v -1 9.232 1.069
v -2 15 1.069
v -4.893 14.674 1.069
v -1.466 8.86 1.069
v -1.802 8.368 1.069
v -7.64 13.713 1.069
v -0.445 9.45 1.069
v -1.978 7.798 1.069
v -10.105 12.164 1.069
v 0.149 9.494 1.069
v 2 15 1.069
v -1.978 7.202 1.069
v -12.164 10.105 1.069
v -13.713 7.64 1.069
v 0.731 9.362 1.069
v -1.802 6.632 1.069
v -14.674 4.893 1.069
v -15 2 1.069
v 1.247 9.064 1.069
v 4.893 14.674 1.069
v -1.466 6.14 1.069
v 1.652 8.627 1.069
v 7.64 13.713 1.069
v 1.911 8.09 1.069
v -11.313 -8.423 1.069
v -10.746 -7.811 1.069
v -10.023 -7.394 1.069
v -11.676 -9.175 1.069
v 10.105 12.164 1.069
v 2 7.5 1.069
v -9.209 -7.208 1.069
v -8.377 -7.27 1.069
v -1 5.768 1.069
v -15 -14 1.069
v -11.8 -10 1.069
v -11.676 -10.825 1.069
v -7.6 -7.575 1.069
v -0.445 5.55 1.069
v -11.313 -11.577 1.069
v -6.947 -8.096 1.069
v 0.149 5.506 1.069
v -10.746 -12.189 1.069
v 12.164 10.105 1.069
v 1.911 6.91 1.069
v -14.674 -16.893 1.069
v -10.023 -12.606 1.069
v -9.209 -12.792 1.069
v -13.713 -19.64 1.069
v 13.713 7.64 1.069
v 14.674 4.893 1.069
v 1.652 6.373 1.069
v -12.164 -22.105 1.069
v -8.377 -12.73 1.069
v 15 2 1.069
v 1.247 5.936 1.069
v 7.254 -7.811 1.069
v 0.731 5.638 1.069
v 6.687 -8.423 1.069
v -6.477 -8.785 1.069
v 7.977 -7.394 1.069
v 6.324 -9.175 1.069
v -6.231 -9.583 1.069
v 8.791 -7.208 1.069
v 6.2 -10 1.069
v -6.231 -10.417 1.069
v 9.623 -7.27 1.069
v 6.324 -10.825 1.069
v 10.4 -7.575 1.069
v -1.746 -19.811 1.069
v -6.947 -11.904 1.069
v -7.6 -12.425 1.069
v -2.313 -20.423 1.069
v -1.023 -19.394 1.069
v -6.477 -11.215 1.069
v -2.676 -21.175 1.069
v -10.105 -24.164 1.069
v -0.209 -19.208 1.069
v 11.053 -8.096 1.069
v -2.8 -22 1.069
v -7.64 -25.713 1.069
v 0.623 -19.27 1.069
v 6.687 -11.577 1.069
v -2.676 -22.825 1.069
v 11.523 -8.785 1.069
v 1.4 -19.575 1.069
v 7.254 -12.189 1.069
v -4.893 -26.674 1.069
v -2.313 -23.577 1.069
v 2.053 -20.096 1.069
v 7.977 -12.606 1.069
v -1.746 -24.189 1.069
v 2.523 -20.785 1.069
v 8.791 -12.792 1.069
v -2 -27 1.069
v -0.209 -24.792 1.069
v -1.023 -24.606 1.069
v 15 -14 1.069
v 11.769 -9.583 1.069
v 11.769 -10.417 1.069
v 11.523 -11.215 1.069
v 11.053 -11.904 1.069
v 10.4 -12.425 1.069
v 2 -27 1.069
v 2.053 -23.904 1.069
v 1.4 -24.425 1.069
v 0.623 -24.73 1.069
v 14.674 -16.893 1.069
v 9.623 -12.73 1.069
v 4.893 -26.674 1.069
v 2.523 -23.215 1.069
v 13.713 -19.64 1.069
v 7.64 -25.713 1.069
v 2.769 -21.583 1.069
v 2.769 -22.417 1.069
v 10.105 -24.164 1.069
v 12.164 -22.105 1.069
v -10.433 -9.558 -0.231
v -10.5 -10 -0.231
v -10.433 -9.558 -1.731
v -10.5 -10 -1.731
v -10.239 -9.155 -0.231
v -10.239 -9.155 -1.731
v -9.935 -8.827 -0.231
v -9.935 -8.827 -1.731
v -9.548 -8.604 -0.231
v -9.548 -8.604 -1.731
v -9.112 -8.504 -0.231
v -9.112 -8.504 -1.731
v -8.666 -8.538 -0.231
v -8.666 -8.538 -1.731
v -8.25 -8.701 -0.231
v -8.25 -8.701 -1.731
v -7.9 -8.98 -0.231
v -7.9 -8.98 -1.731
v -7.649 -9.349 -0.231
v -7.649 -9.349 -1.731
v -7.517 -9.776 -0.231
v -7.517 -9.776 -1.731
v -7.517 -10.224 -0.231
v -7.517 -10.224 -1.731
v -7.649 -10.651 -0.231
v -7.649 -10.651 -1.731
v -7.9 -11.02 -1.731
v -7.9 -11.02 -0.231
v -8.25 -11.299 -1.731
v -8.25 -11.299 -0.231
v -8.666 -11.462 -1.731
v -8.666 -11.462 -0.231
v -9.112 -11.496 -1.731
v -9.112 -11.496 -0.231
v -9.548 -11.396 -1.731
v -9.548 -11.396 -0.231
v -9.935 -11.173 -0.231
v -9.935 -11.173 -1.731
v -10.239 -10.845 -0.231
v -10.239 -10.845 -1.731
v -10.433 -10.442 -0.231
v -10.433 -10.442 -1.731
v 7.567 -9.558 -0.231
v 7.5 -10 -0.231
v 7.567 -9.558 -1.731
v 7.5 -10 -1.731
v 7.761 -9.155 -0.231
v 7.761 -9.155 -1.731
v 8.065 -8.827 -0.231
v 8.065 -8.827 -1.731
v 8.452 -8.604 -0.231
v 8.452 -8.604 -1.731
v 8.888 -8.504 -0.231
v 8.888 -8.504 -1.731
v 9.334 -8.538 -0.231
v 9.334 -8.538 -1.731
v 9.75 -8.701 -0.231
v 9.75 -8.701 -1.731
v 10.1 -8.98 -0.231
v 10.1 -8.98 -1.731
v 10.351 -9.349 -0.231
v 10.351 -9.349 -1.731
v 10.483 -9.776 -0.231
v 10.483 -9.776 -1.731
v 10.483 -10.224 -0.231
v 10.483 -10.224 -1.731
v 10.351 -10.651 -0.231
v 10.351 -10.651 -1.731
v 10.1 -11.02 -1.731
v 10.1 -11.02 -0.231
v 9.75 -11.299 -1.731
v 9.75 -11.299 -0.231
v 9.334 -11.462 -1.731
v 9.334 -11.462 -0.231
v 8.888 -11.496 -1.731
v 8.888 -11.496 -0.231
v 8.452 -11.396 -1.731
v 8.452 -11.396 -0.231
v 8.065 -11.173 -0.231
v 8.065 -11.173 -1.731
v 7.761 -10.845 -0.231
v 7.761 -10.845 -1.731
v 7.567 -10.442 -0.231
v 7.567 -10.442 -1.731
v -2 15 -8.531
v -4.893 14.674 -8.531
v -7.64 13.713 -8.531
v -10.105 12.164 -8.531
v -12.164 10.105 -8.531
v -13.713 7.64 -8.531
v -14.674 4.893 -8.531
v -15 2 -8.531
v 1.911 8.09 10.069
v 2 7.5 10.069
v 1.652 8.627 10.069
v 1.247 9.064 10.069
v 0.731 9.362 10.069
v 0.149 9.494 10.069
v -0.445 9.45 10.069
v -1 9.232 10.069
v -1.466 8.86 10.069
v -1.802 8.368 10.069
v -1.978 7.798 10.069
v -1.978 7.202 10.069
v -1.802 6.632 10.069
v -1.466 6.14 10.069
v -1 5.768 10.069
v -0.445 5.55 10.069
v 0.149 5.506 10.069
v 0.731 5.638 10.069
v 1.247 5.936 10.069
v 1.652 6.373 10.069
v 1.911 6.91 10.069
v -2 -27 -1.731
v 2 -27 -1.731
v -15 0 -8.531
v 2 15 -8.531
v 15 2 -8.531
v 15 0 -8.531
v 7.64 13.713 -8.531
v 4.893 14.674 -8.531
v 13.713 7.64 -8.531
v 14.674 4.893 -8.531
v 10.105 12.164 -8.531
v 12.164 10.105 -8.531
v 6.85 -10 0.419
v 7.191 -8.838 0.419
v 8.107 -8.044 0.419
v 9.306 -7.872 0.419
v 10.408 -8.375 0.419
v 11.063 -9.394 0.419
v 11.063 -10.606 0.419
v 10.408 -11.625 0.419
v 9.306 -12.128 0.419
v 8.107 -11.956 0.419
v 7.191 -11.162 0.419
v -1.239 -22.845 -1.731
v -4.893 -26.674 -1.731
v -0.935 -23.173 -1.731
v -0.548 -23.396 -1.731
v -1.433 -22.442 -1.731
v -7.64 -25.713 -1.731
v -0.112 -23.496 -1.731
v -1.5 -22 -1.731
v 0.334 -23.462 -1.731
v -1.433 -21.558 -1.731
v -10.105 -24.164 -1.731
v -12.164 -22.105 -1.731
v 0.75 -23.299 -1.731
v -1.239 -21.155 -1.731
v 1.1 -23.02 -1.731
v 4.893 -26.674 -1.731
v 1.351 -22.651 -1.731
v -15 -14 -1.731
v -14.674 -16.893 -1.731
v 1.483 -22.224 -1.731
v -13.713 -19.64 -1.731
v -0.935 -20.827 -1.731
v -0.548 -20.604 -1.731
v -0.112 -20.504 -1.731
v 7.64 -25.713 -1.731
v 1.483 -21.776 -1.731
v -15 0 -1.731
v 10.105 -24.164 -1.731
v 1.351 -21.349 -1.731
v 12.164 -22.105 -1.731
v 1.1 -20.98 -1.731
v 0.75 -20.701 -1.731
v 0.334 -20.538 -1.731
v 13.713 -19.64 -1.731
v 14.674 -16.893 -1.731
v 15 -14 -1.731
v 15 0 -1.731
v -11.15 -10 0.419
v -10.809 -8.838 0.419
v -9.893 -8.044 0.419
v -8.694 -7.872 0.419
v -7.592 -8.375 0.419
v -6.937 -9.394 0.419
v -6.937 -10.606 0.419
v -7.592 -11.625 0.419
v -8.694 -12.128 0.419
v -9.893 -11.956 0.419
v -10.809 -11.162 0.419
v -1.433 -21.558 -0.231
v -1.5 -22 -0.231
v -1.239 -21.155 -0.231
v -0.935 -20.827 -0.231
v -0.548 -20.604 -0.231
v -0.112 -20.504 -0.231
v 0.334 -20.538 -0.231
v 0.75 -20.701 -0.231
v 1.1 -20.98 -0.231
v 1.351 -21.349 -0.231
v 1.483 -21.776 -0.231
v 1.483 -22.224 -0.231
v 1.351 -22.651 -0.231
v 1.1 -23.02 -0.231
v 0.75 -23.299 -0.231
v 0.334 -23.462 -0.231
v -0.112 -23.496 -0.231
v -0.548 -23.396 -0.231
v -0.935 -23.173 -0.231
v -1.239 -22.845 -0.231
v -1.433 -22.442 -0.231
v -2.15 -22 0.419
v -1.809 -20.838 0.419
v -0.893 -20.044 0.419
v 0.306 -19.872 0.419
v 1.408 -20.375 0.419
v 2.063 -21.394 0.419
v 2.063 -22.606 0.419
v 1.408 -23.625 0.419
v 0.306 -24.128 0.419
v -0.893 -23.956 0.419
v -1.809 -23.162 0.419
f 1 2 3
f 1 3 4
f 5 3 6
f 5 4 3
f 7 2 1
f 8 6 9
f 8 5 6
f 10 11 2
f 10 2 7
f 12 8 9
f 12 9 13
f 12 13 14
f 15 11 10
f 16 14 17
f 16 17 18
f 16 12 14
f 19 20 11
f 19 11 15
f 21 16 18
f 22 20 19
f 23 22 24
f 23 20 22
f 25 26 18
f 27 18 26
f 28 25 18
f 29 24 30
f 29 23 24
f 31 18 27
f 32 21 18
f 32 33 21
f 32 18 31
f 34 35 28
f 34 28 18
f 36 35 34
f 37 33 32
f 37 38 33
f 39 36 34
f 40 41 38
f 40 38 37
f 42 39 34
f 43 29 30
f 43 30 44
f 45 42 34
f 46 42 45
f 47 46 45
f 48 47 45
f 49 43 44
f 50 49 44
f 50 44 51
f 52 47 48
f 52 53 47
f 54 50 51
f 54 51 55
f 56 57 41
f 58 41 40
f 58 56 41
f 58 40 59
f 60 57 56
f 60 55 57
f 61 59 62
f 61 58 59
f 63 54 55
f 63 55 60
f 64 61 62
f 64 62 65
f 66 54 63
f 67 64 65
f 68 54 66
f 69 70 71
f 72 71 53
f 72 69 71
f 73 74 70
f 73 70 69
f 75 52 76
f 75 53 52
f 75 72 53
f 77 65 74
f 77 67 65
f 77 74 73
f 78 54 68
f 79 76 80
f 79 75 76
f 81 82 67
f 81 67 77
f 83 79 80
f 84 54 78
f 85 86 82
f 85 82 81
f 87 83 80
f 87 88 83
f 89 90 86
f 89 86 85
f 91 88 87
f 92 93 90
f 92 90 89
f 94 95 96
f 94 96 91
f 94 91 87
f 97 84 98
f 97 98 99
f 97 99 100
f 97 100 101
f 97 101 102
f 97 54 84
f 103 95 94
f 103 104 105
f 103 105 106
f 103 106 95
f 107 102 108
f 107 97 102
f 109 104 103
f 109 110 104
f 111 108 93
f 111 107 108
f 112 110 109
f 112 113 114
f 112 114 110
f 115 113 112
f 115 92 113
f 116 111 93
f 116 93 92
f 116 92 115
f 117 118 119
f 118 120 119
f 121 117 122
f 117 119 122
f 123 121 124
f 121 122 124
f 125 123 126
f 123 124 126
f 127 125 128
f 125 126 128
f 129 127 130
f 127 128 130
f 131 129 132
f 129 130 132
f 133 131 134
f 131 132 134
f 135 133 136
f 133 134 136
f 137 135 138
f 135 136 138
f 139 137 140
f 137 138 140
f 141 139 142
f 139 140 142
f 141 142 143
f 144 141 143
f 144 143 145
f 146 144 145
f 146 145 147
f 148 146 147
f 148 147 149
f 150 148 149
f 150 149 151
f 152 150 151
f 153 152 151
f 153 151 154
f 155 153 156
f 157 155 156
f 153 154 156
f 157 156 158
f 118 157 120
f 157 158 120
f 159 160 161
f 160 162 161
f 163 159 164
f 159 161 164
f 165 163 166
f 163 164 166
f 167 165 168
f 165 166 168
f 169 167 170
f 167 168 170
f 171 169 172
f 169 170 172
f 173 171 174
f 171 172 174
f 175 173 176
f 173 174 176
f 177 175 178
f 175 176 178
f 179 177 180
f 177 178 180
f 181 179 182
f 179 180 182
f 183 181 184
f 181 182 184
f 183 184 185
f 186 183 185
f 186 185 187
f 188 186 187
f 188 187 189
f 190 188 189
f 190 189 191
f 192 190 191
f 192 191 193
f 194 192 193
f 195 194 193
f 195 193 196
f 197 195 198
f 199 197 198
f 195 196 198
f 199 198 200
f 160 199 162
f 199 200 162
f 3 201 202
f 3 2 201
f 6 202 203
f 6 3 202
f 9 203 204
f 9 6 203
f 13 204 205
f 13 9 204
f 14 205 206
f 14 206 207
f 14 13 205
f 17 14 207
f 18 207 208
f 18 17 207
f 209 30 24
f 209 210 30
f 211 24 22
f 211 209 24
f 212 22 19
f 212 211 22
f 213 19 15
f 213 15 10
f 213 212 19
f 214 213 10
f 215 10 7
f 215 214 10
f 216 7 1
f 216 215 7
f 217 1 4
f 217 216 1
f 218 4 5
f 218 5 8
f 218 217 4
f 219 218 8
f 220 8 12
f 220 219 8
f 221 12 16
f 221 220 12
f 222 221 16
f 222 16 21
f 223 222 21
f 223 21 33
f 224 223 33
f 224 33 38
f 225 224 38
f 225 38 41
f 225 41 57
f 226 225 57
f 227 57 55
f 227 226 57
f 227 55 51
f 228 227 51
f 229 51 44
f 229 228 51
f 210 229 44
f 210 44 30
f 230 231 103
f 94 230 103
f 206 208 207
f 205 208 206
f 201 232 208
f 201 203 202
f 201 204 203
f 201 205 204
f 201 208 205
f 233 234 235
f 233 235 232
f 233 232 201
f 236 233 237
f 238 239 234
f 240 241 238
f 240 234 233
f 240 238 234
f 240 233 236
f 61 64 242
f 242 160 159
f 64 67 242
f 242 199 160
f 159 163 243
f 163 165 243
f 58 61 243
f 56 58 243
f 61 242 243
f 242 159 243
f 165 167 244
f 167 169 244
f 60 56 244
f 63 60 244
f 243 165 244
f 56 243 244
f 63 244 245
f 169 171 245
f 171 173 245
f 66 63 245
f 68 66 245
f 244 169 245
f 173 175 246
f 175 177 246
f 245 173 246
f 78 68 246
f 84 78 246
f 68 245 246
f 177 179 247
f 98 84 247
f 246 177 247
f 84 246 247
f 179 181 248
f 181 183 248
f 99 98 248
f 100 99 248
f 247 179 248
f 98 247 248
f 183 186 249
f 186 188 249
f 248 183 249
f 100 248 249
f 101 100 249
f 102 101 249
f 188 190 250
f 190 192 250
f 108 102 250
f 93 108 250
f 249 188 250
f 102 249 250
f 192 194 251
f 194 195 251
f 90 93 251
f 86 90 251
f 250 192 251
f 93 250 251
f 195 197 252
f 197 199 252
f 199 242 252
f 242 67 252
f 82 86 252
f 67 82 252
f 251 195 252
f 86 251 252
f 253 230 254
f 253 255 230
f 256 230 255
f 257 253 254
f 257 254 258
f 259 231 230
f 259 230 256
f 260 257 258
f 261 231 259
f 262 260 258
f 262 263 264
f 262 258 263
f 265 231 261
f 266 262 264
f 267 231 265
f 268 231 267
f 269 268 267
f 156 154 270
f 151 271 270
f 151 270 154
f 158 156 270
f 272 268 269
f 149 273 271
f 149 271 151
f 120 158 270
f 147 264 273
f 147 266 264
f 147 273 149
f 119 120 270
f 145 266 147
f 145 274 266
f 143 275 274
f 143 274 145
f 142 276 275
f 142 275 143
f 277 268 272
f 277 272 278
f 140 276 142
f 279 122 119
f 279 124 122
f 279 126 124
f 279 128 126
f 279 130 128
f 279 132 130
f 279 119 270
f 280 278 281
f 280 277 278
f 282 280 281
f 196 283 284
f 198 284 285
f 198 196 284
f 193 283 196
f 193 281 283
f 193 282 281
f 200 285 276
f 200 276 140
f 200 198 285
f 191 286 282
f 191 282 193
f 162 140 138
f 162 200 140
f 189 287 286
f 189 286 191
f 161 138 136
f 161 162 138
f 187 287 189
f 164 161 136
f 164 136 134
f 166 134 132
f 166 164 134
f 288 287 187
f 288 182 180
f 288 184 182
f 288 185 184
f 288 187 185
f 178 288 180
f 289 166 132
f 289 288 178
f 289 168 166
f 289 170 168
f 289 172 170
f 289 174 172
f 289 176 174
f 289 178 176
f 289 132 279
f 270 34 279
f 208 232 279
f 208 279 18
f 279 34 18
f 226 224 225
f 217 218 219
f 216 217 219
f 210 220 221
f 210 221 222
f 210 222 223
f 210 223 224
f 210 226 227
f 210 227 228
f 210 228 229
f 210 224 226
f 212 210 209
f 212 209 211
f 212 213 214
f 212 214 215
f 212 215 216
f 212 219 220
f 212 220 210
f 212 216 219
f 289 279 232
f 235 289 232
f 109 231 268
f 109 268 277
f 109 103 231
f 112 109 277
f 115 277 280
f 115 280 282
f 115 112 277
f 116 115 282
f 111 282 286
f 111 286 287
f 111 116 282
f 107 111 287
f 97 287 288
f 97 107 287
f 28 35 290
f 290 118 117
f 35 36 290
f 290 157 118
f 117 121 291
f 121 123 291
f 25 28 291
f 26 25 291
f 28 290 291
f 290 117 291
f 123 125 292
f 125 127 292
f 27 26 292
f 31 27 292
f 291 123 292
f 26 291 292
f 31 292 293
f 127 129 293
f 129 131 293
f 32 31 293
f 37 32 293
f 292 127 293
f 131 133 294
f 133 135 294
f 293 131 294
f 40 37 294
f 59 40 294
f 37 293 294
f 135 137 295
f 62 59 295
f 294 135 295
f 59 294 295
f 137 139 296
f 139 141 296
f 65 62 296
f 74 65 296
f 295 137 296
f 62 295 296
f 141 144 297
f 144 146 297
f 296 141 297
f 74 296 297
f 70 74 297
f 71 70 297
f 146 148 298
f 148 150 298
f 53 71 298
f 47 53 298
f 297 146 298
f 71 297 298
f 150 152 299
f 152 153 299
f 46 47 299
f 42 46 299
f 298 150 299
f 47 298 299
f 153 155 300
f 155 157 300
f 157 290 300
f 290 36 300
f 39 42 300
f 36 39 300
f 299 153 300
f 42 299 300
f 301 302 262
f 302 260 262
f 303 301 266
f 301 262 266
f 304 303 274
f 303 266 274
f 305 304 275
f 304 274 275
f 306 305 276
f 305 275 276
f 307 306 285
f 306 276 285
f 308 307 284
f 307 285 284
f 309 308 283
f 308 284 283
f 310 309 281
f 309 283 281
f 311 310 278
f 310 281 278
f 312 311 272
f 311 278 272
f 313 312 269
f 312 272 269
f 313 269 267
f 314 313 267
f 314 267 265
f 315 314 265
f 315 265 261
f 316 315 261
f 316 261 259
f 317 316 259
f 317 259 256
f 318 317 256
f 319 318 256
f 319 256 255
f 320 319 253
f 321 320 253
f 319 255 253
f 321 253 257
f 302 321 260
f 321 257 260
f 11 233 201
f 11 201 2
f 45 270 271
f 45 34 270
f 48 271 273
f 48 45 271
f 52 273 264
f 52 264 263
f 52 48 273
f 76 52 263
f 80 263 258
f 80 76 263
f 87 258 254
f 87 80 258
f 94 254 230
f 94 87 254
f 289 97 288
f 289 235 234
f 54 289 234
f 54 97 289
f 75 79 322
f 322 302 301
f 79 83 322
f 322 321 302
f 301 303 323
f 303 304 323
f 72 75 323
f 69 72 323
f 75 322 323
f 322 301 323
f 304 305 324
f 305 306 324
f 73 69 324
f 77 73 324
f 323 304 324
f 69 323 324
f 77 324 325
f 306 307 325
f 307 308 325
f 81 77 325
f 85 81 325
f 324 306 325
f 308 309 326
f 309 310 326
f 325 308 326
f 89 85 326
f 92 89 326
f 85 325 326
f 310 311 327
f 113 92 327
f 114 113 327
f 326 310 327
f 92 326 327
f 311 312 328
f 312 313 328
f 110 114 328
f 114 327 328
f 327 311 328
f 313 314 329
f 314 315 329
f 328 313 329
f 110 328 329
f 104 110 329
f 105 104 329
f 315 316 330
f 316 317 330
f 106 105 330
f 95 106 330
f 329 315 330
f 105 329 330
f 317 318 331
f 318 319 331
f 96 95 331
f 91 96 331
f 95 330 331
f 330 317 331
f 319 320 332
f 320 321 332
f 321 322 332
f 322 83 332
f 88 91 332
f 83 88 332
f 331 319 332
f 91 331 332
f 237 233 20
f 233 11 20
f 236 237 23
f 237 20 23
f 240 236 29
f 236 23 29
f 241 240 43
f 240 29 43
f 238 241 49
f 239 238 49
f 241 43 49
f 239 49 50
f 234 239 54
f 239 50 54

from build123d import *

# Parameters (mm, degrees)
F0_W           = 27
F0_H           = 2.8
F1_DEPTH       = 15
F2_R           = 13
F3_R           = 13
F5_D           = 3
F5_CSINK_D     = 5.6
F5_CSINK_ANGLE = 90
F6_D           = 3
F6_CSINK_D     = 5.6
F6_CSINK_ANGLE = 90
F7_D           = 3
F7_CSINK_D     = 5.6
F7_CSINK_ANGLE = 90
F8_R           = 2
F9_DEPTH       = 9


with BuildPart() as f1:
    # F0 (on Right) → F1 (new body, symmetric)
    with BuildSketch(Plane.YZ):
        Polygon((15, 1.068751), (0, 1.068751), (0, -1.731249), (0, -8.531249), (15, -8.531249), align=None)
        with Locations((-13.5, -0.331249)):
            Rectangle(F0_W, F0_H)
    extrude(amount=F1_DEPTH, both=True)

    # F2
    f2_edges = [f1.edges().sort_by_distance(p)[0] for p in [
        (15, 15, -3.731249),
        (-15, 15, -3.731249),
    ]]
    fillet(f2_edges, radius=F2_R)

    # F3
    f3_edges = [f1.edges().sort_by_distance(p)[0] for p in [
        (15, -27, -0.331249),
        (-15, -27, -0.331249),
    ]]
    fillet(f3_edges, radius=F3_R)

    # F5 (through all)
    with Locations(Plane.XY.offset(1.068751)):
        with Locations((-9, -10)):
            CounterSinkHole(F5_D / 2, F5_CSINK_D / 2, counter_sink_angle=F5_CSINK_ANGLE)

    # F6 (through all)
    with Locations(Plane.XY.offset(1.068751)):
        with Locations((9, -10)):
            CounterSinkHole(F6_D / 2, F6_CSINK_D / 2, counter_sink_angle=F6_CSINK_ANGLE)

    # F7 (through all)
    with Locations(Plane.XY.offset(1.068751)):
        with Locations((0, -22)):
            CounterSinkHole(F7_D / 2, F7_CSINK_D / 2, counter_sink_angle=F7_CSINK_ANGLE)

    # F8 (on face) → F9 (join, symmetric)
    with BuildSketch(Plane.XY.offset(1.068751)):
        with Locations((0, 7.5)):
            Circle(F8_R)
    extrude(amount=F9_DEPTH, both=True)


solid = f1.part
